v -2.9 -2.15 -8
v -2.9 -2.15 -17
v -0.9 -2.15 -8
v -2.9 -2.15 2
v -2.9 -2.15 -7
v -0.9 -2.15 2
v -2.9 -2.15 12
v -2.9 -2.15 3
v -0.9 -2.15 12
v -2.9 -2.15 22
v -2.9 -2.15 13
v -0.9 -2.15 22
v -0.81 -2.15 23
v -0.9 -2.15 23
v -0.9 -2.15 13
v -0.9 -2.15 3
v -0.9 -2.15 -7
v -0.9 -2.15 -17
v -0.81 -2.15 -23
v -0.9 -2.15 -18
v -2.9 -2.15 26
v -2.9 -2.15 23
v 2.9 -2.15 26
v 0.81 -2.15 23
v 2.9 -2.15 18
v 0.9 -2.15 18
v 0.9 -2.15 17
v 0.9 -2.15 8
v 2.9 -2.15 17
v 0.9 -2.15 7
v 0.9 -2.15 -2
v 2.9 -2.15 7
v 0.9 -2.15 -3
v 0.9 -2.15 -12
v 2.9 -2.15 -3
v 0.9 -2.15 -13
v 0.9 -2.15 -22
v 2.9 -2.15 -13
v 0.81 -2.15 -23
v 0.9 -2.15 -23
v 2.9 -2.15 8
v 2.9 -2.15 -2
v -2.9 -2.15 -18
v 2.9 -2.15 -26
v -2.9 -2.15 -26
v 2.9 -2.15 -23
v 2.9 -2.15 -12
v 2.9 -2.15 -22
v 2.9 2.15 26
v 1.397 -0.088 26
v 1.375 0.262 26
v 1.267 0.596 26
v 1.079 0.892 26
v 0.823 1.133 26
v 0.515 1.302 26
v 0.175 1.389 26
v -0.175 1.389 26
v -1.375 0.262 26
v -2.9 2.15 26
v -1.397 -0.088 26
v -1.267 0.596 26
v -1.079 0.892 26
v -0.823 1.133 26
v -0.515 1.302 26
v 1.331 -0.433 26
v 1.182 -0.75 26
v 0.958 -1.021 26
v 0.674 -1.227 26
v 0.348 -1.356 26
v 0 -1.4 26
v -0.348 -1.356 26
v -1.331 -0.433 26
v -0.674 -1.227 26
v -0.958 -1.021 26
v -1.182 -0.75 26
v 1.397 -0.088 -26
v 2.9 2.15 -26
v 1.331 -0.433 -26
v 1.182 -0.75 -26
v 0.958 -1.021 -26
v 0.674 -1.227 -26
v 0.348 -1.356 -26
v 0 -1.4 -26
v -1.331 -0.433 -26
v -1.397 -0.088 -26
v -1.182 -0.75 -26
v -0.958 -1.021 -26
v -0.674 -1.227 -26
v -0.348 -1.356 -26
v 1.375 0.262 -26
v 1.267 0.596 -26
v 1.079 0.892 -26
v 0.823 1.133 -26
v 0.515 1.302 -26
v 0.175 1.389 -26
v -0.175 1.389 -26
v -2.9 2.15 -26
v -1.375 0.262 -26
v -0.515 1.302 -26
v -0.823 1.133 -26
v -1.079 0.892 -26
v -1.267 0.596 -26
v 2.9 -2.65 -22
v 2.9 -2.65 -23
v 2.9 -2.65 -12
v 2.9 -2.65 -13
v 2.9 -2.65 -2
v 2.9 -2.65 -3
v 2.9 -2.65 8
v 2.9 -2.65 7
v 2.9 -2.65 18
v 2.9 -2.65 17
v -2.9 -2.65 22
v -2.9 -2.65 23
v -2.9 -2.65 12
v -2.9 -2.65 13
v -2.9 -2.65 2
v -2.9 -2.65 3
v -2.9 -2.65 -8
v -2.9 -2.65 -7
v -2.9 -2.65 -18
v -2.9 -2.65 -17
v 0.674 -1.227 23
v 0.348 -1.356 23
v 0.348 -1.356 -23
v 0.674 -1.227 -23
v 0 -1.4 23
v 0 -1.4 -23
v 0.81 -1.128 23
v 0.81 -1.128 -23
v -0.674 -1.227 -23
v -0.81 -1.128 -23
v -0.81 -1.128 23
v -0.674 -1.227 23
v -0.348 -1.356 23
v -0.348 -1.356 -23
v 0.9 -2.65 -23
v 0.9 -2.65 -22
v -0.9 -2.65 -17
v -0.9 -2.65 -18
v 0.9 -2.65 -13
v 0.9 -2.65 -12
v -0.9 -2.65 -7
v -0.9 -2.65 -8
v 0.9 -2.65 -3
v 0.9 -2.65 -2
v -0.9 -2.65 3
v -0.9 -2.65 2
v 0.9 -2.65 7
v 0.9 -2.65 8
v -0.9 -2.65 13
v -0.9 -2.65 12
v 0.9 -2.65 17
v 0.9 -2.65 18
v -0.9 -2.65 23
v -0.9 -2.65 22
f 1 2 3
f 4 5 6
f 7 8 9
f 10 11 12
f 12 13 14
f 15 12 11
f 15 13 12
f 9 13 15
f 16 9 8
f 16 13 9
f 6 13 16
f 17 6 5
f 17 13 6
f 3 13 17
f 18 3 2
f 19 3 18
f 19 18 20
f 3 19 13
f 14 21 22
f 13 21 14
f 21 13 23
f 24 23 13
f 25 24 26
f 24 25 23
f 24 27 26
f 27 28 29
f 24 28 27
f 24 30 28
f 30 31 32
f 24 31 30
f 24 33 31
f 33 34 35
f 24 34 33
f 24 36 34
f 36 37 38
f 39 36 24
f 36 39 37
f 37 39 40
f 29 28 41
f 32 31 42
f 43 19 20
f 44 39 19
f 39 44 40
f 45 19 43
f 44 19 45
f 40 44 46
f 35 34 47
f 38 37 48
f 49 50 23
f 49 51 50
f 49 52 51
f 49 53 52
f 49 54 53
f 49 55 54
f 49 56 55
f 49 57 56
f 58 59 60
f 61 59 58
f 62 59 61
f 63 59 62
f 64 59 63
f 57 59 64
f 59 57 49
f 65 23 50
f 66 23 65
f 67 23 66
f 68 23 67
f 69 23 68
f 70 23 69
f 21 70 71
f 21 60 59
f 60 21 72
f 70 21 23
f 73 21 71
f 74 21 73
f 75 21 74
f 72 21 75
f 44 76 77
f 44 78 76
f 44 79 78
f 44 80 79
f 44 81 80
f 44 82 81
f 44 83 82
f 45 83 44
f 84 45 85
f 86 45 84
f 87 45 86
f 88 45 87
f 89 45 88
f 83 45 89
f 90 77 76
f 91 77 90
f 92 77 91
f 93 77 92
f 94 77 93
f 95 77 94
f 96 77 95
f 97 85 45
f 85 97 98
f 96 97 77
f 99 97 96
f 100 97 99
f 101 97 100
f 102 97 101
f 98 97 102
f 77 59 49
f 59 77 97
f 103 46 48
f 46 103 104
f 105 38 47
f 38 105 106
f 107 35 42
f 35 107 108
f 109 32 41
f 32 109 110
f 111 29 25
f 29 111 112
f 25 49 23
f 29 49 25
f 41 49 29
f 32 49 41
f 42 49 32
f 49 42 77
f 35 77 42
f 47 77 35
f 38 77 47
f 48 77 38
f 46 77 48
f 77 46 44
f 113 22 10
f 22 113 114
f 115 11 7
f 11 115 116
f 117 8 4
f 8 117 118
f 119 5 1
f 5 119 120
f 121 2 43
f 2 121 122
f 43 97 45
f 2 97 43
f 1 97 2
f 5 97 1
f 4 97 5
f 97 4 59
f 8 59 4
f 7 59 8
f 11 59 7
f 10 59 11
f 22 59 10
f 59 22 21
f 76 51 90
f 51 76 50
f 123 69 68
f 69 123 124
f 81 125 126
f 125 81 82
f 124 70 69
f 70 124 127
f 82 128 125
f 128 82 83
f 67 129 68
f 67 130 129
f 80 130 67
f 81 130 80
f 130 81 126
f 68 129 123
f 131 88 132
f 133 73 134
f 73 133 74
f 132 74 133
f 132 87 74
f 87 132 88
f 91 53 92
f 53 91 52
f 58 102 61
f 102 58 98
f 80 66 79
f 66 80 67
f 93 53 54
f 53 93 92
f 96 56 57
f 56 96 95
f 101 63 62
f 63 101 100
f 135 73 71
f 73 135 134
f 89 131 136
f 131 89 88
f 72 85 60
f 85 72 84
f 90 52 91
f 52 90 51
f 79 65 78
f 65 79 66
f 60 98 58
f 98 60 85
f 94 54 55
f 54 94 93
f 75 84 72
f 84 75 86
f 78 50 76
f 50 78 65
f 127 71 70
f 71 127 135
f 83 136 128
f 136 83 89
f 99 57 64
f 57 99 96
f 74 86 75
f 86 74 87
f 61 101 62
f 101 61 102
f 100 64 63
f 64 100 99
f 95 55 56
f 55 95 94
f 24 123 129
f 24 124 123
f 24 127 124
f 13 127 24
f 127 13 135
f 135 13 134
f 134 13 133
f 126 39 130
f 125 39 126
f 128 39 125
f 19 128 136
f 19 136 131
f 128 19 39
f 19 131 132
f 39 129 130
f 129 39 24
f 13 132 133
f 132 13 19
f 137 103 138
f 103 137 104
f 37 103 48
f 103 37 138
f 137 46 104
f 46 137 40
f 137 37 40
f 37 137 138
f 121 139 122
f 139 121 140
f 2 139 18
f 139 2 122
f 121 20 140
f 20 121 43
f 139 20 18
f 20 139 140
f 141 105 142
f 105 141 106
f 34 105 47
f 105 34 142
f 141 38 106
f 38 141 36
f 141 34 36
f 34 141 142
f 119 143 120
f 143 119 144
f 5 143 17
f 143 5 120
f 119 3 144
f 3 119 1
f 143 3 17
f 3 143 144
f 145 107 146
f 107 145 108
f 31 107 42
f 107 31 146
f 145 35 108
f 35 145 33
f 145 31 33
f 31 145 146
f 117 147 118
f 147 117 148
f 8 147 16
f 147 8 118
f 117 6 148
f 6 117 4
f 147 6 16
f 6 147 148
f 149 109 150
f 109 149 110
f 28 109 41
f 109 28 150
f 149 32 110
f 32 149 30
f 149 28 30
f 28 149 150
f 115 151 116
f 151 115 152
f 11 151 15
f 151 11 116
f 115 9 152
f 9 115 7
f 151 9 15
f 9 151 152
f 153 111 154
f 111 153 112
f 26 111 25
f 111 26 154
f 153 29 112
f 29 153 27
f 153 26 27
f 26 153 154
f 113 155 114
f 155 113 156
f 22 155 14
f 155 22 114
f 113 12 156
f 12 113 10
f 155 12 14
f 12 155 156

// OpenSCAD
FilamentDiameter = 1.8;
// Total size will be ToolSize+2
ToolSize = 50;
ShowFilament = 0; // [0:No, 1:Yes]
InnerHole = 1; // [0:Cube, 1:Cylinder]
ThicknessAdjustX = 2.5;
// Keep little bigger than X one
ThicknessAdjustY = 4; 

/* [HIDDEN] */
$fn = 25;
FilamentRadius = FilamentDiameter/2;
toolX = FilamentDiameter+ThicknessAdjustX;
toolY = FilamentDiameter+ThicknessAdjustY;
baseToolSize = ToolSize +2;

// Rotate to better preview in Thingiverse
rotate([0,0,-90])
    tool();
if(1==ShowFilament){
    cylinder(h=baseToolSize*1.2,r=FilamentRadius,center=true);
}

module tool(){
    addRadius = 0.5;
    difference(){
        cube([toolX,toolY,baseToolSize],center=true);
        
        translate([0,0,-baseToolSize*0.25]) 
        if(0==InnerHole)
            cube([2*(FilamentRadius+addRadius),
                  2*(FilamentRadius+addRadius),
                  baseToolSize*2],center=true);
        else
            cylinder(r=FilamentRadius+addRadius,h=baseToolSize*2,center=true);
        
        translate([toolX/2,0,0])
            cube([toolX/2,FilamentDiameter*0.9,baseToolSize-6],center=true);
    }
    fc = FilamentDiameter < 2.25 ? 1.5 : 1.25;
    markSize = ThicknessAdjustY/2;
    for(i = [0:1:(baseToolSize/5)-1]){
        z = 3-(baseToolSize/2) + 5 * i;
        if(z < (baseToolSize/2)-3){ // Precaution IF
            translate([toolX/2,-(markSize/2)+((i%2==0 ? 1 : -1)*(FilamentRadius+markSize/2)),z])
                cube([0.5,markSize,1]);
        }
    }
}
